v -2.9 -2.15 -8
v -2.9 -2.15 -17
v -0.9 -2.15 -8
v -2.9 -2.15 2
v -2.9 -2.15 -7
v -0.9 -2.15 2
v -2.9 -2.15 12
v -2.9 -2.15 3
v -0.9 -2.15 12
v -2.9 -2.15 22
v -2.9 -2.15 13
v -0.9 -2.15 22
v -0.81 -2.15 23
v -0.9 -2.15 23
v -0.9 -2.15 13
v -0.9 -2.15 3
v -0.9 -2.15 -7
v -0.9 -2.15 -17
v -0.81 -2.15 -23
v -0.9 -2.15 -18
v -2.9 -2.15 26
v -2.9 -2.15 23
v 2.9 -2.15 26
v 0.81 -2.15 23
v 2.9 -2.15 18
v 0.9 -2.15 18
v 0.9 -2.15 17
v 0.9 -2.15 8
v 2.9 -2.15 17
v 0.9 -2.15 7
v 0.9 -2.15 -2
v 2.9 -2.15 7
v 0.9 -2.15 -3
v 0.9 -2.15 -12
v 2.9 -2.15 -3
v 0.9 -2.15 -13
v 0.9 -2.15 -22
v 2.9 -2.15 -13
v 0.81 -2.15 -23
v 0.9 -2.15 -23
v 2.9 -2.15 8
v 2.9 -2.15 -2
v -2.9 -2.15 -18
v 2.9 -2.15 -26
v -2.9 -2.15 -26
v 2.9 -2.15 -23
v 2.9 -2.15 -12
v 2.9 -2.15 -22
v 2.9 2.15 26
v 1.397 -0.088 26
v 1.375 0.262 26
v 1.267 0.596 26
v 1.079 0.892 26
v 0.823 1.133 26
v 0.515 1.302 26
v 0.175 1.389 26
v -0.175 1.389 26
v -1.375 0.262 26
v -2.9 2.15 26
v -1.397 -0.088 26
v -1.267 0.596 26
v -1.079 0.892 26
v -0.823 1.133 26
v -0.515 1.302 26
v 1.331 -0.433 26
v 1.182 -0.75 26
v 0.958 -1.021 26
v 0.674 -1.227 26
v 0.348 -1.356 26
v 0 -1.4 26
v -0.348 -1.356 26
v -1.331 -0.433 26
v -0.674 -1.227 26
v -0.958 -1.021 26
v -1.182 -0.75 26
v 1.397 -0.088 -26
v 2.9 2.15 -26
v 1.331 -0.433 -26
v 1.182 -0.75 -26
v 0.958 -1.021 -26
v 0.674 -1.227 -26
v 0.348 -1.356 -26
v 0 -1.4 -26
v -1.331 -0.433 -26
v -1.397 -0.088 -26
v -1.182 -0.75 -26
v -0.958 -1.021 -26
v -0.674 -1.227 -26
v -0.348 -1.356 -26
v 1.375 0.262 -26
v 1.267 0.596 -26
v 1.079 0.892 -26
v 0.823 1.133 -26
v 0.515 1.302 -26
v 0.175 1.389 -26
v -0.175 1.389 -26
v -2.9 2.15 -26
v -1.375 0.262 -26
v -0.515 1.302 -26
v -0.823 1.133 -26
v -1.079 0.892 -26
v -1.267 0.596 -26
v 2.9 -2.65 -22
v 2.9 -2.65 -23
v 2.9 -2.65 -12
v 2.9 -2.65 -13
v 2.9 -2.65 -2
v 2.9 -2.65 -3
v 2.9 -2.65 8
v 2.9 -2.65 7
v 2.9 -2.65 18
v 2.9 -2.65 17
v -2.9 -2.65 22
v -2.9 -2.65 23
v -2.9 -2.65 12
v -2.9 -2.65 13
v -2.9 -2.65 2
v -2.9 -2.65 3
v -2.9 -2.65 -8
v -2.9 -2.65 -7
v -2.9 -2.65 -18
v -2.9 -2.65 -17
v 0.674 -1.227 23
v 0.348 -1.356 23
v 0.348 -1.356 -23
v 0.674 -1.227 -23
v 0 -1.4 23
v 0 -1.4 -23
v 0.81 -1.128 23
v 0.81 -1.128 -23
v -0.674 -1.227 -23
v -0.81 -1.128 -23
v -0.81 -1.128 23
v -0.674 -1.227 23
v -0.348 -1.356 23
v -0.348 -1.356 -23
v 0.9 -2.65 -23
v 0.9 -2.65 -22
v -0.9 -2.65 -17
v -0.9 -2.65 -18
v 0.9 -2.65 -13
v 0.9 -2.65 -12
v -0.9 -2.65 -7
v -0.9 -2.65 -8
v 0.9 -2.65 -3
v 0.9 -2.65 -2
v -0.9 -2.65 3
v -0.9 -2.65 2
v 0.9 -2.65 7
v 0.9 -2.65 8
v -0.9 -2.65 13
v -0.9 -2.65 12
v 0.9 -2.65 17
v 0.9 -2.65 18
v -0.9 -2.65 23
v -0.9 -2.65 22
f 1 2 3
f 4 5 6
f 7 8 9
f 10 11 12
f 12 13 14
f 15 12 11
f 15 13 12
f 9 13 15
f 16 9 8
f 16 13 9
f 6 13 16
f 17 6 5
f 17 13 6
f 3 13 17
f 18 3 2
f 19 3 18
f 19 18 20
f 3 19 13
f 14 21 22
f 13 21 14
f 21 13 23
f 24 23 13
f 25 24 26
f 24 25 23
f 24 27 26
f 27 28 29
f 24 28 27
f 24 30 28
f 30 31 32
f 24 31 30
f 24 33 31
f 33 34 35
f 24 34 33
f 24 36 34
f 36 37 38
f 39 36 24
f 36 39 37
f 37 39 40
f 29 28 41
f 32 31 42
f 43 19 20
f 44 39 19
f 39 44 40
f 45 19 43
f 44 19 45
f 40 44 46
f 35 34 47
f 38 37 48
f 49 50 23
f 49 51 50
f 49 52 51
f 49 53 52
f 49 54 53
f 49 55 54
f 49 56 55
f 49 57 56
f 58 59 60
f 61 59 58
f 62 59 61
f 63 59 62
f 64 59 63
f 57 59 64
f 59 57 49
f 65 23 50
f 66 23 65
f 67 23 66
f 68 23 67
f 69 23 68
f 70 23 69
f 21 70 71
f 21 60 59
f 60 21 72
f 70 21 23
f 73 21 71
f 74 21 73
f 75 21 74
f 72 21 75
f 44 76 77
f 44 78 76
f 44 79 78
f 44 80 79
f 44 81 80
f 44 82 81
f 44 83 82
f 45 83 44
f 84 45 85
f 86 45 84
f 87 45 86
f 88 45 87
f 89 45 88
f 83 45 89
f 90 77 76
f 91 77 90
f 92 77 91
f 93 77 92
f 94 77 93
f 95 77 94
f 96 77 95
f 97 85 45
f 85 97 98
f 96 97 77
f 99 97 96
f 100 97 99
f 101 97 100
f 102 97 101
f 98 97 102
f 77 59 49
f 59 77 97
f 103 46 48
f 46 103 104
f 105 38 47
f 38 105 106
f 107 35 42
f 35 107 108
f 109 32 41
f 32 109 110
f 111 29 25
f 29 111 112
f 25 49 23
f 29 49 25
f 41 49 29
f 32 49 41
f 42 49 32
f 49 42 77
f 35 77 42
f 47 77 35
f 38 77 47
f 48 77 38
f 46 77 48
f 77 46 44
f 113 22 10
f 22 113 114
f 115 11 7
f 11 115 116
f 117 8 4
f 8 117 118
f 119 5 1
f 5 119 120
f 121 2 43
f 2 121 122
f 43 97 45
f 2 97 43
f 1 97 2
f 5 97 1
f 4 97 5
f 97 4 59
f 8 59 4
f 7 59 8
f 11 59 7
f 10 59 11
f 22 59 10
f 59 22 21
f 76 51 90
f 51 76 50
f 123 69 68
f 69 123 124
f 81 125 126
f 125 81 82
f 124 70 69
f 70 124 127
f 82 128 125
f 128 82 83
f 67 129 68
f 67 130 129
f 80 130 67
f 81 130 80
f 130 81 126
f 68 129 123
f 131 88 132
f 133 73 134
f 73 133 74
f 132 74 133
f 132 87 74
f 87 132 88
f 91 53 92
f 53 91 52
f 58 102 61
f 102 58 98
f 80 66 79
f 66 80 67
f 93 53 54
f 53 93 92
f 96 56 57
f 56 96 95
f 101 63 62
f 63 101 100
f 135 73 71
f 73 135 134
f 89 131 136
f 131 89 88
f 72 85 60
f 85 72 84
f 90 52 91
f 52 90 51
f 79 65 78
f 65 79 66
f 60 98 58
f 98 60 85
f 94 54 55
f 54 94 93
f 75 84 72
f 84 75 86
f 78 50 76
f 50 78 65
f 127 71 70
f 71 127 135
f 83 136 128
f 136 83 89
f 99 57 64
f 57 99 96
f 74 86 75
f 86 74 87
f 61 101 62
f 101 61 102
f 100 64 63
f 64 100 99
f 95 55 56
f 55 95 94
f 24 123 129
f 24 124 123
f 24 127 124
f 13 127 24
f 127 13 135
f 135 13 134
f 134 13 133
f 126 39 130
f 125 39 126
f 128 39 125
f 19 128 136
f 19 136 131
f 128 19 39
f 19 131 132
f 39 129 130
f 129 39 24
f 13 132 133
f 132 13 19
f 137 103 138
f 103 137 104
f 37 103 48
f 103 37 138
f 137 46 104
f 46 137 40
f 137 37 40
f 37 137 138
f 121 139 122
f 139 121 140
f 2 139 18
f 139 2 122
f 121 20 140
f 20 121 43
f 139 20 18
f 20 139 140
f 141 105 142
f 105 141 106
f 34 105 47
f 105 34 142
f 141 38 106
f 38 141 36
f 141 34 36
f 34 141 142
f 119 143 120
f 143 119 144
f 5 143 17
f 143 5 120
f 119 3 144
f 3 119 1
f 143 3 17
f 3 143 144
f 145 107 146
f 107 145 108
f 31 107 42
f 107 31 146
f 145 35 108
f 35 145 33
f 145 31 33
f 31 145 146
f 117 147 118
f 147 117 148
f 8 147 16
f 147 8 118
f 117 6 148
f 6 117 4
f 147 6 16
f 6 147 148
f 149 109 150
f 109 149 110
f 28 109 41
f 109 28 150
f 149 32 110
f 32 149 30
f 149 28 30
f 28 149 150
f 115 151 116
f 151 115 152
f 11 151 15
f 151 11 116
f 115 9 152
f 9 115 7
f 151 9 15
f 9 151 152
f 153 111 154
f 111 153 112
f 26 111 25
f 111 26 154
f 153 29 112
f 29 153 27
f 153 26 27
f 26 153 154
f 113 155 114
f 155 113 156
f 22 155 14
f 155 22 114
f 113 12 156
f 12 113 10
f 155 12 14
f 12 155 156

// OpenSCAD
FilamentDiameter = 1.8;
// Total size will be ToolSize+2
ToolSize = 50;
ShowFilament = 0; // [0:No, 1:Yes]
InnerHole = 1; // [0:Cube, 1:Cylinder]
ThicknessAdjustX = 2.5;
// Keep little bigger than X one
ThicknessAdjustY = 4; 

/* [HIDDEN] */
$fn = 25;
FilamentRadius = FilamentDiameter/2;
toolX = FilamentDiameter+ThicknessAdjustX;
toolY = FilamentDiameter+ThicknessAdjustY;
baseToolSize = ToolSize +2;

// Rotate to better preview in Thingiverse
rotate([0,0,-90])
    tool();
if(1==ShowFilament){
    cylinder(h=baseToolSize*1.2,r=FilamentRadius,center=true);
}

module tool(){
    addRadius = 0.5;
    difference(){
        cube([toolX,toolY,baseToolSize],center=true);
        
        translate([0,0,-baseToolSize*0.25]) 
        if(0==InnerHole)
            cube([2*(FilamentRadius+addRadius),
                  2*(FilamentRadius+addRadius),
                  baseToolSize*2],center=true);
        else
            cylinder(r=FilamentRadius+addRadius,h=baseToolSize*2,center=true);
        
        translate([toolX/2,0,0])
            cube([toolX/2,FilamentDiameter*0.9,baseToolSize-6],center=true);
    }
    fc = FilamentDiameter < 2.25 ? 1.5 : 1.25;
    markSize = ThicknessAdjustY/2;
    for(i = [0:1:(baseToolSize/5)-1]){
        z = 3-(baseToolSize/2) + 5 * i;
        if(z < (baseToolSize/2)-3){ // Precaution IF
            translate([toolX/2,-(markSize/2)+((i%2==0 ? 1 : -1)*(FilamentRadius+markSize/2)),z])
                cube([0.5,markSize,1]);
        }
    }
}
